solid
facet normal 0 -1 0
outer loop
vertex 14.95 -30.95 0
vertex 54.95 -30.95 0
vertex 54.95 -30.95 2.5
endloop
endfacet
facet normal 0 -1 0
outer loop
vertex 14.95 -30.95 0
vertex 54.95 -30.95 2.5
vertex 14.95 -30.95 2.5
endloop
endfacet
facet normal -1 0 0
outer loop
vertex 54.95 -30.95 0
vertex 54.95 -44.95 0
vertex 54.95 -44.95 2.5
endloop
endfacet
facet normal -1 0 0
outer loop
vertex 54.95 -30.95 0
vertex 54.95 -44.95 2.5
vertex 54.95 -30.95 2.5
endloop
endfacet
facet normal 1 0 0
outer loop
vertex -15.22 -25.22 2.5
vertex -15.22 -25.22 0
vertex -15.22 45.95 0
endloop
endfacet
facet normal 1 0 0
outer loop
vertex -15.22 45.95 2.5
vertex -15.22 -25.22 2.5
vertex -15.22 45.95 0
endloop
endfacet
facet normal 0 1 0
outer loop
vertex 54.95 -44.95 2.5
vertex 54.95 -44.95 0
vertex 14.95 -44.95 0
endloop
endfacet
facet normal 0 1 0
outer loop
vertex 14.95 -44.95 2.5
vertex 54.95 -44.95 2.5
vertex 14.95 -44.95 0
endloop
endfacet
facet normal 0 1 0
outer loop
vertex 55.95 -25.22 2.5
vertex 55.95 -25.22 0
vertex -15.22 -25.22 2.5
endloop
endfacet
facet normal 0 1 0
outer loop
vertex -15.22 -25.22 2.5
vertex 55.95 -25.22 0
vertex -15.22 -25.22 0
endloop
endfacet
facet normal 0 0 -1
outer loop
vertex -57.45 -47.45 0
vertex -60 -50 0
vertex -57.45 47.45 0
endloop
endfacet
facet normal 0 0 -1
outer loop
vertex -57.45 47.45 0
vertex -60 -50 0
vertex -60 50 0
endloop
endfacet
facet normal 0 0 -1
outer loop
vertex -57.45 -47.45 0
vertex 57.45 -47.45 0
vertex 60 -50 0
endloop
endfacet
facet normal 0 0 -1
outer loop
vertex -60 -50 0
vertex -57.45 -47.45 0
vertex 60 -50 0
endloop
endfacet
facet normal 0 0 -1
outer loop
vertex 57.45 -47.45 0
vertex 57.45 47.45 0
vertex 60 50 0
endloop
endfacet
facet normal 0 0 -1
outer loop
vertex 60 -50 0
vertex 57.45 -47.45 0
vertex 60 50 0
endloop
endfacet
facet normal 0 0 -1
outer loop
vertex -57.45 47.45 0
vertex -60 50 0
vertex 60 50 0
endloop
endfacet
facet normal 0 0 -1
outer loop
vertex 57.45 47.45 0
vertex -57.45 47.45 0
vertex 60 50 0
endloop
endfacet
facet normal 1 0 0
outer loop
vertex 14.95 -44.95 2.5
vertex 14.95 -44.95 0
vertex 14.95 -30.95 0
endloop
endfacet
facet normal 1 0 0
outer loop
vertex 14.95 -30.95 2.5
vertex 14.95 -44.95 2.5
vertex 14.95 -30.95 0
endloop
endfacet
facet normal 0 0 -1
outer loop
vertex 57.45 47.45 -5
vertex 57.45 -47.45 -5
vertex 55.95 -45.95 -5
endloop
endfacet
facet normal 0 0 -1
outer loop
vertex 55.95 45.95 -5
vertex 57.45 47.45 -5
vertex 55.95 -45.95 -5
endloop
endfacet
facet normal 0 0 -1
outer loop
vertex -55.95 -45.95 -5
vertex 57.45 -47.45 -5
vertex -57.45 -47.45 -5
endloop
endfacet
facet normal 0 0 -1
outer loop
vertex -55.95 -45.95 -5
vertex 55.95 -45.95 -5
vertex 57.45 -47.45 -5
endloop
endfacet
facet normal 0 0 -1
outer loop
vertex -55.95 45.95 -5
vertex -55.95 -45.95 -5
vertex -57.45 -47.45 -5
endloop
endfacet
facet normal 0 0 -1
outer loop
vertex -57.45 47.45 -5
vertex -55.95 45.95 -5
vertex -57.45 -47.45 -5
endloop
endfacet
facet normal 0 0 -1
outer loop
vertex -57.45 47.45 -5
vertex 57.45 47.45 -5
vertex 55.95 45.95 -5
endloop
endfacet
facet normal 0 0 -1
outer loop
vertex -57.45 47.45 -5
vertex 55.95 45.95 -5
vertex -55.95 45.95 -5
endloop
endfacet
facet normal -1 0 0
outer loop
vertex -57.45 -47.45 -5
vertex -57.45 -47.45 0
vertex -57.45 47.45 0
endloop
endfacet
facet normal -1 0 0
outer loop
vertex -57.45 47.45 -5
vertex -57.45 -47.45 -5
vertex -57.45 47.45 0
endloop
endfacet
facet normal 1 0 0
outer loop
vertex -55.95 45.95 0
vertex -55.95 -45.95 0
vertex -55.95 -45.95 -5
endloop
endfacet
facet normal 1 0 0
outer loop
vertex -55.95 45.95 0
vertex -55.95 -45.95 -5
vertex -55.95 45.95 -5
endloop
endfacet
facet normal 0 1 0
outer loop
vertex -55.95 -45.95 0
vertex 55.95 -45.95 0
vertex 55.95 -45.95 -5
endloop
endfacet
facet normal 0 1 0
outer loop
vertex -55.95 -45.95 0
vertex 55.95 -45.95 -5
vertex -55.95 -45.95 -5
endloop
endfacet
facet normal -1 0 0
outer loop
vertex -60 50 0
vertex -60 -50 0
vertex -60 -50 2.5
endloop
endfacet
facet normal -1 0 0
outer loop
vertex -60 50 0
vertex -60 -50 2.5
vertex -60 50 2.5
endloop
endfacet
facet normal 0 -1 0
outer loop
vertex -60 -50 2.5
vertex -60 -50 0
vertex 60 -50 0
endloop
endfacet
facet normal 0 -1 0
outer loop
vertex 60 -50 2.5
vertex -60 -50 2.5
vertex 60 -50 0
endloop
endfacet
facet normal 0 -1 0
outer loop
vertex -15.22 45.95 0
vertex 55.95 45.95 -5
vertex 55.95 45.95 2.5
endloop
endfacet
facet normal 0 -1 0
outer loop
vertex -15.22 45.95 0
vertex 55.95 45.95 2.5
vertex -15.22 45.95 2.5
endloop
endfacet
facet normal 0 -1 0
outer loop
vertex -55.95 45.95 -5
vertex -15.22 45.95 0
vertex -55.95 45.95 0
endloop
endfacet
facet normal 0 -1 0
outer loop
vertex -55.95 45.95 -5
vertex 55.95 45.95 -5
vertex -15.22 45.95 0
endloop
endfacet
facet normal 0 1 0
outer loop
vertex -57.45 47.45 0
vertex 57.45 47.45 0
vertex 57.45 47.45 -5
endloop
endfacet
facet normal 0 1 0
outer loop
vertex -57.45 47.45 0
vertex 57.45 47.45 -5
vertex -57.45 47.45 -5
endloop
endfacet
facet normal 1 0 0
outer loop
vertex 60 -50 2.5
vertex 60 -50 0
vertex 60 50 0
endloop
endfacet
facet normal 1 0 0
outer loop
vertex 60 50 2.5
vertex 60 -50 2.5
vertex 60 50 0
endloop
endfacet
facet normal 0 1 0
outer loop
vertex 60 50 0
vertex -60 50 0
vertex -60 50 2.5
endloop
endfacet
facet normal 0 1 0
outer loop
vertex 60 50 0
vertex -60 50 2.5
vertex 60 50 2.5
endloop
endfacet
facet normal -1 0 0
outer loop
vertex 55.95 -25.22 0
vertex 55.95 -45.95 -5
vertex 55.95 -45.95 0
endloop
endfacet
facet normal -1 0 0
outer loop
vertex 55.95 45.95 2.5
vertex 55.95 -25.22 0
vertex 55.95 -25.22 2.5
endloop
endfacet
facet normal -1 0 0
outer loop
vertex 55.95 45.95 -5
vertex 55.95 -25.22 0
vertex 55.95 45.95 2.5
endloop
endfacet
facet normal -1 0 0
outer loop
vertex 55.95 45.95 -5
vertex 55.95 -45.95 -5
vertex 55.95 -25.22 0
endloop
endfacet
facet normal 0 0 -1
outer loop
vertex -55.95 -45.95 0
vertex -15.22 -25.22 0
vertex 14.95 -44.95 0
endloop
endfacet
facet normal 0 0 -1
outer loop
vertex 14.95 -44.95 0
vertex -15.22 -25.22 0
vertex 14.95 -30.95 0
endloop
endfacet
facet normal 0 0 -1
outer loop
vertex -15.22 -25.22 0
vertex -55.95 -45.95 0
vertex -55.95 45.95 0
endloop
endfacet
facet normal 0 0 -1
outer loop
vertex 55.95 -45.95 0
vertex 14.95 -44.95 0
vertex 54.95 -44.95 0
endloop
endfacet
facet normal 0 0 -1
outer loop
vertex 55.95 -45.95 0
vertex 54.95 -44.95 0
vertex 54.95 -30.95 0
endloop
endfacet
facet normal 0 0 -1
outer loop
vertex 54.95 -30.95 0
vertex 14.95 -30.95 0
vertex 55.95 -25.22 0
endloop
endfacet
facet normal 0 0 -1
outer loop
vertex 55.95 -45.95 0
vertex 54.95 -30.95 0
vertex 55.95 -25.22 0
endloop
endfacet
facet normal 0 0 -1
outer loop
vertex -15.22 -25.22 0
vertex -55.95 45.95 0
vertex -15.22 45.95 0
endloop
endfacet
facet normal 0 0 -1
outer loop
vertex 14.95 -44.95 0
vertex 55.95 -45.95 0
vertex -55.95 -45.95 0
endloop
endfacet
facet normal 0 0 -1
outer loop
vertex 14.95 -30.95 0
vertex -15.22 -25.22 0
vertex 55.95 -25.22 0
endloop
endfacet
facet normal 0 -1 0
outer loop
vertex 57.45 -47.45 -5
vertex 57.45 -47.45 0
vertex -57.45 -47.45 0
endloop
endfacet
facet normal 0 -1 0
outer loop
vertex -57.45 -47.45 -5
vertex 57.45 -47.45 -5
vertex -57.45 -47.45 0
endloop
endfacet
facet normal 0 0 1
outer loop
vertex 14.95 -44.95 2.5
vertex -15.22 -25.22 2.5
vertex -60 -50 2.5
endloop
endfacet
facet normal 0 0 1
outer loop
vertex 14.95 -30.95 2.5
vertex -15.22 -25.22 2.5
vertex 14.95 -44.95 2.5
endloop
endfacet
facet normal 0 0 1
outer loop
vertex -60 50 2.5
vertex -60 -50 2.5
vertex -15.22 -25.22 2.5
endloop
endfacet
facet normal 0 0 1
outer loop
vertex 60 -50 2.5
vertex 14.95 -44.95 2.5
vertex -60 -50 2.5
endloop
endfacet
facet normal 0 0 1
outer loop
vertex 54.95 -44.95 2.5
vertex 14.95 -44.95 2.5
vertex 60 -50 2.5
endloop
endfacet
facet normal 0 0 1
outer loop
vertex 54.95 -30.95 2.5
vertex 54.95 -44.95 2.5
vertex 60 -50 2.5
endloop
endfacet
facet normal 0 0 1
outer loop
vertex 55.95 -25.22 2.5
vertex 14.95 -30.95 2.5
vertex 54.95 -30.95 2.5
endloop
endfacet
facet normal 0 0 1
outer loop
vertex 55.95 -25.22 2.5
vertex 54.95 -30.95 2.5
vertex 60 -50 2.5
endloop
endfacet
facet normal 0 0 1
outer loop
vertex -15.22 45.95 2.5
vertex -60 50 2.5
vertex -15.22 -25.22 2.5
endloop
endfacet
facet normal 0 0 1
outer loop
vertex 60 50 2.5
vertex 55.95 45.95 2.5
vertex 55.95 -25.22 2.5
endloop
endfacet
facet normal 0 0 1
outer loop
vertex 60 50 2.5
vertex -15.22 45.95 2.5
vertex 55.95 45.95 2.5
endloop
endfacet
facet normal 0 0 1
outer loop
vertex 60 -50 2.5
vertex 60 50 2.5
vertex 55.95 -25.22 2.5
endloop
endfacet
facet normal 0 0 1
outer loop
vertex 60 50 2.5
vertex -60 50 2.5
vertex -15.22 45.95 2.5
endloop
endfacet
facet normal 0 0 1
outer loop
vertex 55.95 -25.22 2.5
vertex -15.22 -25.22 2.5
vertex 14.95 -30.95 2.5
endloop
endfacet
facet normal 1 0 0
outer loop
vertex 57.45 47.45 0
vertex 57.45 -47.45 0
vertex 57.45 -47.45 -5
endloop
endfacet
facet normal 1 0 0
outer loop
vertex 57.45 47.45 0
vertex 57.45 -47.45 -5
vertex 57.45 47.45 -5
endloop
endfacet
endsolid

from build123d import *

# Parameters (mm, degrees)
SKETCH2_W           = 120
SKETCH2_H           = 100
BOSS_EXTRUDE1_DEPTH = 2.5
SKETCH3_W           = 114.9
SKETCH3_H           = 94.9
SKETCH3_W_2         = 111.9
SKETCH3_H_2         = 91.9
BOSS_EXTRUDE2_DEPTH = 5
SKETCH4_W           = 71.17
SKETCH4_H           = 71.17
SKETCH4_W_2         = 40
SKETCH4_H_2         = 14
CUT_EXTRUDE1_DEPTH  = 2.5


with BuildPart() as part:
    # Sketch2 → Boss-Extrude1 (new body)
    with BuildSketch(Plane.XY):
        Rectangle(SKETCH2_W, SKETCH2_H)
    extrude(amount=BOSS_EXTRUDE1_DEPTH)

    # Sketch3 → Boss-Extrude2 (add)
    with BuildSketch(Plane(origin=(0, 0, 0), x_dir=(-1, 0, 0), z_dir=(0, 0, -1))):
        Rectangle(SKETCH3_W, SKETCH3_H)
        Rectangle(SKETCH3_W_2, SKETCH3_H_2, mode=Mode.SUBTRACT)
    extrude(amount=BOSS_EXTRUDE2_DEPTH)

    # Sketch4 → Cut-Extrude1 (cut)
    with BuildSketch(Plane(origin=(0, 0, 0), x_dir=(-1, 0, 0), z_dir=(0, 0, -1))):
        with Locations((-20.365, 10.365)):
            Rectangle(SKETCH4_W, SKETCH4_H)
        with Locations((-34.95, -37.95)):
            Rectangle(SKETCH4_W_2, SKETCH4_H_2)
    extrude(amount=-CUT_EXTRUDE1_DEPTH, mode=Mode.SUBTRACT)


solid = part.part
